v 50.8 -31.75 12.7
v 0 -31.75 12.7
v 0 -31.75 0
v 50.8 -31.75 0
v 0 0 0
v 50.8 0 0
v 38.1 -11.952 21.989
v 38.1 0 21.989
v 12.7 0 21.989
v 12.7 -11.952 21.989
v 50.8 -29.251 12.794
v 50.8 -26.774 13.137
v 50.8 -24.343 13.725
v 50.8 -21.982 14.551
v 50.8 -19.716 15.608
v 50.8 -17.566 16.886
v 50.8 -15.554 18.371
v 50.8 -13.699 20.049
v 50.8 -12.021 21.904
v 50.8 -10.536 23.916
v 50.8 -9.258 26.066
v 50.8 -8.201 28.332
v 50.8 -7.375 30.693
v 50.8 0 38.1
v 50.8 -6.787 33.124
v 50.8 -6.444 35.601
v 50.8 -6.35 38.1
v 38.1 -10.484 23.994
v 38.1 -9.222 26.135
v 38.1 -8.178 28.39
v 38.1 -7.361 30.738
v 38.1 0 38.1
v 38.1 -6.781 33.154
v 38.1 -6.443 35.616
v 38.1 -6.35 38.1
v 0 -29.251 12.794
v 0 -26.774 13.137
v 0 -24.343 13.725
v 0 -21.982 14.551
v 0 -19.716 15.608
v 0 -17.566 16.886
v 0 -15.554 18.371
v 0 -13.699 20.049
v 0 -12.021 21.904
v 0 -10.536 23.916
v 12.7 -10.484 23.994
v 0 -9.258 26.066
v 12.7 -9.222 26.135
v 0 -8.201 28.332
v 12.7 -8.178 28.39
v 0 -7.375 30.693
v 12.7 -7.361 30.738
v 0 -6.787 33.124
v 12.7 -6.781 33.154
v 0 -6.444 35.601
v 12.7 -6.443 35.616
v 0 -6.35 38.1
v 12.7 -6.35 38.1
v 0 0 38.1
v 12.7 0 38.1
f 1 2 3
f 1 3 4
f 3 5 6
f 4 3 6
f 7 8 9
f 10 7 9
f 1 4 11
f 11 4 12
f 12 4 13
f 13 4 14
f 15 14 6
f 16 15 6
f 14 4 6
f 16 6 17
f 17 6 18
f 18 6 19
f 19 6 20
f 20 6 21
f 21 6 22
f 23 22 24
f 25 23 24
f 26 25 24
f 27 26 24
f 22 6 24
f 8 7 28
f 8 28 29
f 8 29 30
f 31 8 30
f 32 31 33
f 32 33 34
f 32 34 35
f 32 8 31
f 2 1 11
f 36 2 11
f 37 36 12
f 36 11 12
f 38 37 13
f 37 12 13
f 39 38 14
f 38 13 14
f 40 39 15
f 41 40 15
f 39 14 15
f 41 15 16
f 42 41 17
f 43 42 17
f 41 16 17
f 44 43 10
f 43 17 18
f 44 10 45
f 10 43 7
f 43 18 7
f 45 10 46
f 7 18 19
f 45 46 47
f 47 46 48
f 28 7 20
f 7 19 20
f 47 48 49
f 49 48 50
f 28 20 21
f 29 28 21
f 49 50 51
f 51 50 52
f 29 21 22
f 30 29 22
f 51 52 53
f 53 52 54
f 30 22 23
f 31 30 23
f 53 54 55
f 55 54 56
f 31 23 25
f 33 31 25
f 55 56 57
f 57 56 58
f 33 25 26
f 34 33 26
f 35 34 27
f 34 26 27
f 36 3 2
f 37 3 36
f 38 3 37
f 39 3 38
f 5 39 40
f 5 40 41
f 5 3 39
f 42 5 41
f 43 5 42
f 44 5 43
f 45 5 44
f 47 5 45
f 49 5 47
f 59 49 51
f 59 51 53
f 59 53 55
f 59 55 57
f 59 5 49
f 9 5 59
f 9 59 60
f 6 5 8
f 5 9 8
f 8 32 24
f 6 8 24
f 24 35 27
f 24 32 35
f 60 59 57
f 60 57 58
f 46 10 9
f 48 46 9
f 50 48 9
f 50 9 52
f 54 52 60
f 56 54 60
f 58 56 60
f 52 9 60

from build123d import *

# Parameters (mm, degrees)
F0_W     = 50.8
F0_H     = 38.1
F1_DEPTH = 31.75
F2_W     = 25.4
F2_H     = 16.111437
F3_DEPTH = 12.7
F5_DEPTH = 50.801


with BuildPart() as f1:
    # F0 (on Front) → F1 (new body)
    with BuildSketch(Plane.XZ):
        with Locations((25.4, 19.05)):
            Rectangle(F0_W, F0_H)
    extrude(amount=F1_DEPTH)

    # F2 (on face) → F3 (cut)
    with BuildSketch(Plane(origin=(0, 0, 0), x_dir=(-1, 0, 0), z_dir=(0, 1, 0))):
        with Locations((-25.4, 30.044282)):
            Rectangle(F2_W, F2_H)
    extrude(amount=-F3_DEPTH, mode=Mode.SUBTRACT)

    # F4 (on face) → F5 (cut, through all)
    with BuildSketch(Plane.YZ.offset(50.8)):
        with BuildLine():
            Line((-31.75, 38.1), (-31.75, 12.7))
            ThreePointArc((-31.75, 12.7), (-13.699472, 20.049472), (-6.35, 38.1))
            Line((-6.35, 38.1), (-31.75, 38.1))
        make_face()
    extrude(amount=-F5_DEPTH, mode=Mode.SUBTRACT)


solid = f1.part
